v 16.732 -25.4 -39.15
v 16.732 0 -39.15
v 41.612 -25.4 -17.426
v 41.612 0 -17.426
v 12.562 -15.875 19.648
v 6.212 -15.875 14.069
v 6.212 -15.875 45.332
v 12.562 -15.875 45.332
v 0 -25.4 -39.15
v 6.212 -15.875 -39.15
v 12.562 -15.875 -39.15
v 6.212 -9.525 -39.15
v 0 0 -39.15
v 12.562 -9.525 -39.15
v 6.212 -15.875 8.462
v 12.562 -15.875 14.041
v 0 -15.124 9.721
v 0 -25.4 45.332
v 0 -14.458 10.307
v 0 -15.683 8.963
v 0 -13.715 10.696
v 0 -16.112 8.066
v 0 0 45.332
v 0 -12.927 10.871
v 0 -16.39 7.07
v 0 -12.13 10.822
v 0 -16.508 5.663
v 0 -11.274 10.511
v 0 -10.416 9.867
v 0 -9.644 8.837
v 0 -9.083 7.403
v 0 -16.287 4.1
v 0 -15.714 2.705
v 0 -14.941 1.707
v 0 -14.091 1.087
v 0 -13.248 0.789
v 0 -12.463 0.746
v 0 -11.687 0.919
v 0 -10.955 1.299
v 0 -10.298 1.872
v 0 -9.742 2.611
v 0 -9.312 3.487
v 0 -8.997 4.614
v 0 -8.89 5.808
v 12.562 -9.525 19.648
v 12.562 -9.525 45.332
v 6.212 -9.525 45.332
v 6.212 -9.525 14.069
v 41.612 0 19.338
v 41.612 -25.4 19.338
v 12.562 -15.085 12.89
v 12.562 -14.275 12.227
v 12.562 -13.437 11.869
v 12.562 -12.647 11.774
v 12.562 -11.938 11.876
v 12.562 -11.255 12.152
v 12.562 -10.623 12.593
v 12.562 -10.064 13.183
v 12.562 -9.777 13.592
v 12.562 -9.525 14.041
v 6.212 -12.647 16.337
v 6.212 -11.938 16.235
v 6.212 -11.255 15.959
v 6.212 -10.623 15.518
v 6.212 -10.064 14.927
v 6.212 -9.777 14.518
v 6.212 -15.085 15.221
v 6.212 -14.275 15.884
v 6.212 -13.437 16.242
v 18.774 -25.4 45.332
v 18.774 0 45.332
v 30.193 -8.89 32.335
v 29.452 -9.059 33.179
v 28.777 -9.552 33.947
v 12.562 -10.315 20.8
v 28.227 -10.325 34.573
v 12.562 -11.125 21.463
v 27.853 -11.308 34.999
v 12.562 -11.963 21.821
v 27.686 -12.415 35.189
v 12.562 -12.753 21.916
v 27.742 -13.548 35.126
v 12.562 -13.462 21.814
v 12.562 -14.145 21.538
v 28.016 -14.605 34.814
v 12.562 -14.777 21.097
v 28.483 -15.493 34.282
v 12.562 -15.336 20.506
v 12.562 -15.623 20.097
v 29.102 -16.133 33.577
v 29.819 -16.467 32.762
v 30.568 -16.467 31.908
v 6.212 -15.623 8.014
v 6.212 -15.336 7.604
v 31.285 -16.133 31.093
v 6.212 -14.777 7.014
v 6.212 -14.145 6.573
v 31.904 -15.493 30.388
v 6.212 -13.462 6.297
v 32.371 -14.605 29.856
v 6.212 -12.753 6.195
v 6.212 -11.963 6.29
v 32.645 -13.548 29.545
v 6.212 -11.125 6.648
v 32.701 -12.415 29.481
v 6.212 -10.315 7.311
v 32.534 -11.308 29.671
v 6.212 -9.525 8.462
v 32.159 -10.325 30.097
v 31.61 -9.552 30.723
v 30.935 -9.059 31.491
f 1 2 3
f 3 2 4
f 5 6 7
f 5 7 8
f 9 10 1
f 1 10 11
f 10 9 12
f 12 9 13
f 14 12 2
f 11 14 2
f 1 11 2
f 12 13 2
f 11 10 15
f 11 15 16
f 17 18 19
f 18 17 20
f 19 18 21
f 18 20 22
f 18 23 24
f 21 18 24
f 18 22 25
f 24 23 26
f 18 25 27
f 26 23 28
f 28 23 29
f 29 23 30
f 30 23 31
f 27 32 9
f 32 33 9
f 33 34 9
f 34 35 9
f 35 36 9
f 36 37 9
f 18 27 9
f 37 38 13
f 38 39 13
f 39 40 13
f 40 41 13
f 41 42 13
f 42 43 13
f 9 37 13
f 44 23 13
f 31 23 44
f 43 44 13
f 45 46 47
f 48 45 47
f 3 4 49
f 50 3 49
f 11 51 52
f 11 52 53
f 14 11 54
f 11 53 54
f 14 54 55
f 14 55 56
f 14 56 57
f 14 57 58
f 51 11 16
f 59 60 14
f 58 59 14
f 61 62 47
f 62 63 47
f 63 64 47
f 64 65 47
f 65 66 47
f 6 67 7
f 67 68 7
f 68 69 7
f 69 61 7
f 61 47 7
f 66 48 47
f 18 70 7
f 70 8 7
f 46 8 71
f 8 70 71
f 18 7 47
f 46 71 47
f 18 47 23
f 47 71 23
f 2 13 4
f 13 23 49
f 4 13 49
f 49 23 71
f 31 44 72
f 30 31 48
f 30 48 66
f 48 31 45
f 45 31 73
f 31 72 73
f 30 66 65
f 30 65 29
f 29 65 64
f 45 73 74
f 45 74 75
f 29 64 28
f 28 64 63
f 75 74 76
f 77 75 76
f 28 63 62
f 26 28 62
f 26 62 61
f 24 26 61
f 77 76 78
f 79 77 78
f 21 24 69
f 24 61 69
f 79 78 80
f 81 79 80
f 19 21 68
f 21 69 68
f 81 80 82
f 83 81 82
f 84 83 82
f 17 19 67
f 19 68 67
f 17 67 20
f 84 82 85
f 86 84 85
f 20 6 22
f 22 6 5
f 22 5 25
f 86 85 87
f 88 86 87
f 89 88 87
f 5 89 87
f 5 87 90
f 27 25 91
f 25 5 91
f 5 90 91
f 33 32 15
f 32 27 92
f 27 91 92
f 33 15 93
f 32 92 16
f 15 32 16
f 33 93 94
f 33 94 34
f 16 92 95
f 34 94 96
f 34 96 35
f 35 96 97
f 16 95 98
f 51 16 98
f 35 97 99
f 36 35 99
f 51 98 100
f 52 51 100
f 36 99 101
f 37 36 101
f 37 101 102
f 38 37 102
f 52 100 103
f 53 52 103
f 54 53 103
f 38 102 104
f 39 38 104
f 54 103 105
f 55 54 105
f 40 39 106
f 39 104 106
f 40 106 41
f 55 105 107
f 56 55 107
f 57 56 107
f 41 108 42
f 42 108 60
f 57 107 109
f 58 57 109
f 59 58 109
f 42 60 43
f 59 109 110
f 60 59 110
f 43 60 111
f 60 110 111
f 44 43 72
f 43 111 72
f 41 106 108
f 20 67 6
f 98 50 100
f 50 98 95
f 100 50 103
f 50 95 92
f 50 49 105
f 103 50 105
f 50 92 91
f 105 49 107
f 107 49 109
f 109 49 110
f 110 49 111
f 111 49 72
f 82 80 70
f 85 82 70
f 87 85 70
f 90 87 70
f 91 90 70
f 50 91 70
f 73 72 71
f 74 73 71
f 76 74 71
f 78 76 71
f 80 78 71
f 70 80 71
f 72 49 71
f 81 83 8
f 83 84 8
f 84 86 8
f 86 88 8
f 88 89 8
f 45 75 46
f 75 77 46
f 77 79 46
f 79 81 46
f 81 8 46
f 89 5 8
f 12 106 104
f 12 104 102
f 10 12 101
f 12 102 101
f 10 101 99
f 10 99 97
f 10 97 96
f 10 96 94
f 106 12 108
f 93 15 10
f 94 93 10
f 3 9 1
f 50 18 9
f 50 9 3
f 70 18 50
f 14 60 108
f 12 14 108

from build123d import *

# Parameters (mm, degrees)
F1_DEPTH = 25.4
F2_R     = 3.81
F3_DEPTH = 69.8653654545
F4_W     = 3.175
F4_H     = 3.175
F5_DEPTH = 84.483178092


with BuildPart() as f1:
    # F0 (on Front) → F1 (new body)
    with BuildSketch(Plane.XZ):
        Polygon((0, 45.3323423862), (0, 0), (0, -39.1498357058), (16.7319830507, -39.1498357058), (41.6124537587, -17.4258463085), (41.6124537587, 19.3378273398), (18.7744107097, 45.3323423862), align=None)
    extrude(amount=F1_DEPTH)

    # F2 (on face) → F3 (cut, through all)
    with BuildSketch(Plane(origin=(33.0732626697, 0, 29.057229776), x_dir=(0, 1, 0), z_dir=(0.7512454532, 0, 0.6600229306))):
        with Locations((-12.7, 4.3632278543)):
            Circle(F2_R)
    extrude(amount=-F3_DEPTH, mode=Mode.SUBTRACT)

    # F4 (on face) → F5 (cut, through all)
    with BuildSketch(Plane.XY.offset(45.3323423862)):
        with Locations((7.7997053549, -14.2875)):
            Rectangle(F4_W, F4_H)
        with Locations((7.7997053549, -11.1125)):
            Rectangle(F4_W, F4_H)
        with Locations((10.9747053549, -11.1125)):
            Rectangle(F4_W, F4_H)
        with Locations((10.9747053549, -14.2875)):
            Rectangle(F4_W, F4_H)
    extrude(amount=-F5_DEPTH, mode=Mode.SUBTRACT)


solid = f1.part
